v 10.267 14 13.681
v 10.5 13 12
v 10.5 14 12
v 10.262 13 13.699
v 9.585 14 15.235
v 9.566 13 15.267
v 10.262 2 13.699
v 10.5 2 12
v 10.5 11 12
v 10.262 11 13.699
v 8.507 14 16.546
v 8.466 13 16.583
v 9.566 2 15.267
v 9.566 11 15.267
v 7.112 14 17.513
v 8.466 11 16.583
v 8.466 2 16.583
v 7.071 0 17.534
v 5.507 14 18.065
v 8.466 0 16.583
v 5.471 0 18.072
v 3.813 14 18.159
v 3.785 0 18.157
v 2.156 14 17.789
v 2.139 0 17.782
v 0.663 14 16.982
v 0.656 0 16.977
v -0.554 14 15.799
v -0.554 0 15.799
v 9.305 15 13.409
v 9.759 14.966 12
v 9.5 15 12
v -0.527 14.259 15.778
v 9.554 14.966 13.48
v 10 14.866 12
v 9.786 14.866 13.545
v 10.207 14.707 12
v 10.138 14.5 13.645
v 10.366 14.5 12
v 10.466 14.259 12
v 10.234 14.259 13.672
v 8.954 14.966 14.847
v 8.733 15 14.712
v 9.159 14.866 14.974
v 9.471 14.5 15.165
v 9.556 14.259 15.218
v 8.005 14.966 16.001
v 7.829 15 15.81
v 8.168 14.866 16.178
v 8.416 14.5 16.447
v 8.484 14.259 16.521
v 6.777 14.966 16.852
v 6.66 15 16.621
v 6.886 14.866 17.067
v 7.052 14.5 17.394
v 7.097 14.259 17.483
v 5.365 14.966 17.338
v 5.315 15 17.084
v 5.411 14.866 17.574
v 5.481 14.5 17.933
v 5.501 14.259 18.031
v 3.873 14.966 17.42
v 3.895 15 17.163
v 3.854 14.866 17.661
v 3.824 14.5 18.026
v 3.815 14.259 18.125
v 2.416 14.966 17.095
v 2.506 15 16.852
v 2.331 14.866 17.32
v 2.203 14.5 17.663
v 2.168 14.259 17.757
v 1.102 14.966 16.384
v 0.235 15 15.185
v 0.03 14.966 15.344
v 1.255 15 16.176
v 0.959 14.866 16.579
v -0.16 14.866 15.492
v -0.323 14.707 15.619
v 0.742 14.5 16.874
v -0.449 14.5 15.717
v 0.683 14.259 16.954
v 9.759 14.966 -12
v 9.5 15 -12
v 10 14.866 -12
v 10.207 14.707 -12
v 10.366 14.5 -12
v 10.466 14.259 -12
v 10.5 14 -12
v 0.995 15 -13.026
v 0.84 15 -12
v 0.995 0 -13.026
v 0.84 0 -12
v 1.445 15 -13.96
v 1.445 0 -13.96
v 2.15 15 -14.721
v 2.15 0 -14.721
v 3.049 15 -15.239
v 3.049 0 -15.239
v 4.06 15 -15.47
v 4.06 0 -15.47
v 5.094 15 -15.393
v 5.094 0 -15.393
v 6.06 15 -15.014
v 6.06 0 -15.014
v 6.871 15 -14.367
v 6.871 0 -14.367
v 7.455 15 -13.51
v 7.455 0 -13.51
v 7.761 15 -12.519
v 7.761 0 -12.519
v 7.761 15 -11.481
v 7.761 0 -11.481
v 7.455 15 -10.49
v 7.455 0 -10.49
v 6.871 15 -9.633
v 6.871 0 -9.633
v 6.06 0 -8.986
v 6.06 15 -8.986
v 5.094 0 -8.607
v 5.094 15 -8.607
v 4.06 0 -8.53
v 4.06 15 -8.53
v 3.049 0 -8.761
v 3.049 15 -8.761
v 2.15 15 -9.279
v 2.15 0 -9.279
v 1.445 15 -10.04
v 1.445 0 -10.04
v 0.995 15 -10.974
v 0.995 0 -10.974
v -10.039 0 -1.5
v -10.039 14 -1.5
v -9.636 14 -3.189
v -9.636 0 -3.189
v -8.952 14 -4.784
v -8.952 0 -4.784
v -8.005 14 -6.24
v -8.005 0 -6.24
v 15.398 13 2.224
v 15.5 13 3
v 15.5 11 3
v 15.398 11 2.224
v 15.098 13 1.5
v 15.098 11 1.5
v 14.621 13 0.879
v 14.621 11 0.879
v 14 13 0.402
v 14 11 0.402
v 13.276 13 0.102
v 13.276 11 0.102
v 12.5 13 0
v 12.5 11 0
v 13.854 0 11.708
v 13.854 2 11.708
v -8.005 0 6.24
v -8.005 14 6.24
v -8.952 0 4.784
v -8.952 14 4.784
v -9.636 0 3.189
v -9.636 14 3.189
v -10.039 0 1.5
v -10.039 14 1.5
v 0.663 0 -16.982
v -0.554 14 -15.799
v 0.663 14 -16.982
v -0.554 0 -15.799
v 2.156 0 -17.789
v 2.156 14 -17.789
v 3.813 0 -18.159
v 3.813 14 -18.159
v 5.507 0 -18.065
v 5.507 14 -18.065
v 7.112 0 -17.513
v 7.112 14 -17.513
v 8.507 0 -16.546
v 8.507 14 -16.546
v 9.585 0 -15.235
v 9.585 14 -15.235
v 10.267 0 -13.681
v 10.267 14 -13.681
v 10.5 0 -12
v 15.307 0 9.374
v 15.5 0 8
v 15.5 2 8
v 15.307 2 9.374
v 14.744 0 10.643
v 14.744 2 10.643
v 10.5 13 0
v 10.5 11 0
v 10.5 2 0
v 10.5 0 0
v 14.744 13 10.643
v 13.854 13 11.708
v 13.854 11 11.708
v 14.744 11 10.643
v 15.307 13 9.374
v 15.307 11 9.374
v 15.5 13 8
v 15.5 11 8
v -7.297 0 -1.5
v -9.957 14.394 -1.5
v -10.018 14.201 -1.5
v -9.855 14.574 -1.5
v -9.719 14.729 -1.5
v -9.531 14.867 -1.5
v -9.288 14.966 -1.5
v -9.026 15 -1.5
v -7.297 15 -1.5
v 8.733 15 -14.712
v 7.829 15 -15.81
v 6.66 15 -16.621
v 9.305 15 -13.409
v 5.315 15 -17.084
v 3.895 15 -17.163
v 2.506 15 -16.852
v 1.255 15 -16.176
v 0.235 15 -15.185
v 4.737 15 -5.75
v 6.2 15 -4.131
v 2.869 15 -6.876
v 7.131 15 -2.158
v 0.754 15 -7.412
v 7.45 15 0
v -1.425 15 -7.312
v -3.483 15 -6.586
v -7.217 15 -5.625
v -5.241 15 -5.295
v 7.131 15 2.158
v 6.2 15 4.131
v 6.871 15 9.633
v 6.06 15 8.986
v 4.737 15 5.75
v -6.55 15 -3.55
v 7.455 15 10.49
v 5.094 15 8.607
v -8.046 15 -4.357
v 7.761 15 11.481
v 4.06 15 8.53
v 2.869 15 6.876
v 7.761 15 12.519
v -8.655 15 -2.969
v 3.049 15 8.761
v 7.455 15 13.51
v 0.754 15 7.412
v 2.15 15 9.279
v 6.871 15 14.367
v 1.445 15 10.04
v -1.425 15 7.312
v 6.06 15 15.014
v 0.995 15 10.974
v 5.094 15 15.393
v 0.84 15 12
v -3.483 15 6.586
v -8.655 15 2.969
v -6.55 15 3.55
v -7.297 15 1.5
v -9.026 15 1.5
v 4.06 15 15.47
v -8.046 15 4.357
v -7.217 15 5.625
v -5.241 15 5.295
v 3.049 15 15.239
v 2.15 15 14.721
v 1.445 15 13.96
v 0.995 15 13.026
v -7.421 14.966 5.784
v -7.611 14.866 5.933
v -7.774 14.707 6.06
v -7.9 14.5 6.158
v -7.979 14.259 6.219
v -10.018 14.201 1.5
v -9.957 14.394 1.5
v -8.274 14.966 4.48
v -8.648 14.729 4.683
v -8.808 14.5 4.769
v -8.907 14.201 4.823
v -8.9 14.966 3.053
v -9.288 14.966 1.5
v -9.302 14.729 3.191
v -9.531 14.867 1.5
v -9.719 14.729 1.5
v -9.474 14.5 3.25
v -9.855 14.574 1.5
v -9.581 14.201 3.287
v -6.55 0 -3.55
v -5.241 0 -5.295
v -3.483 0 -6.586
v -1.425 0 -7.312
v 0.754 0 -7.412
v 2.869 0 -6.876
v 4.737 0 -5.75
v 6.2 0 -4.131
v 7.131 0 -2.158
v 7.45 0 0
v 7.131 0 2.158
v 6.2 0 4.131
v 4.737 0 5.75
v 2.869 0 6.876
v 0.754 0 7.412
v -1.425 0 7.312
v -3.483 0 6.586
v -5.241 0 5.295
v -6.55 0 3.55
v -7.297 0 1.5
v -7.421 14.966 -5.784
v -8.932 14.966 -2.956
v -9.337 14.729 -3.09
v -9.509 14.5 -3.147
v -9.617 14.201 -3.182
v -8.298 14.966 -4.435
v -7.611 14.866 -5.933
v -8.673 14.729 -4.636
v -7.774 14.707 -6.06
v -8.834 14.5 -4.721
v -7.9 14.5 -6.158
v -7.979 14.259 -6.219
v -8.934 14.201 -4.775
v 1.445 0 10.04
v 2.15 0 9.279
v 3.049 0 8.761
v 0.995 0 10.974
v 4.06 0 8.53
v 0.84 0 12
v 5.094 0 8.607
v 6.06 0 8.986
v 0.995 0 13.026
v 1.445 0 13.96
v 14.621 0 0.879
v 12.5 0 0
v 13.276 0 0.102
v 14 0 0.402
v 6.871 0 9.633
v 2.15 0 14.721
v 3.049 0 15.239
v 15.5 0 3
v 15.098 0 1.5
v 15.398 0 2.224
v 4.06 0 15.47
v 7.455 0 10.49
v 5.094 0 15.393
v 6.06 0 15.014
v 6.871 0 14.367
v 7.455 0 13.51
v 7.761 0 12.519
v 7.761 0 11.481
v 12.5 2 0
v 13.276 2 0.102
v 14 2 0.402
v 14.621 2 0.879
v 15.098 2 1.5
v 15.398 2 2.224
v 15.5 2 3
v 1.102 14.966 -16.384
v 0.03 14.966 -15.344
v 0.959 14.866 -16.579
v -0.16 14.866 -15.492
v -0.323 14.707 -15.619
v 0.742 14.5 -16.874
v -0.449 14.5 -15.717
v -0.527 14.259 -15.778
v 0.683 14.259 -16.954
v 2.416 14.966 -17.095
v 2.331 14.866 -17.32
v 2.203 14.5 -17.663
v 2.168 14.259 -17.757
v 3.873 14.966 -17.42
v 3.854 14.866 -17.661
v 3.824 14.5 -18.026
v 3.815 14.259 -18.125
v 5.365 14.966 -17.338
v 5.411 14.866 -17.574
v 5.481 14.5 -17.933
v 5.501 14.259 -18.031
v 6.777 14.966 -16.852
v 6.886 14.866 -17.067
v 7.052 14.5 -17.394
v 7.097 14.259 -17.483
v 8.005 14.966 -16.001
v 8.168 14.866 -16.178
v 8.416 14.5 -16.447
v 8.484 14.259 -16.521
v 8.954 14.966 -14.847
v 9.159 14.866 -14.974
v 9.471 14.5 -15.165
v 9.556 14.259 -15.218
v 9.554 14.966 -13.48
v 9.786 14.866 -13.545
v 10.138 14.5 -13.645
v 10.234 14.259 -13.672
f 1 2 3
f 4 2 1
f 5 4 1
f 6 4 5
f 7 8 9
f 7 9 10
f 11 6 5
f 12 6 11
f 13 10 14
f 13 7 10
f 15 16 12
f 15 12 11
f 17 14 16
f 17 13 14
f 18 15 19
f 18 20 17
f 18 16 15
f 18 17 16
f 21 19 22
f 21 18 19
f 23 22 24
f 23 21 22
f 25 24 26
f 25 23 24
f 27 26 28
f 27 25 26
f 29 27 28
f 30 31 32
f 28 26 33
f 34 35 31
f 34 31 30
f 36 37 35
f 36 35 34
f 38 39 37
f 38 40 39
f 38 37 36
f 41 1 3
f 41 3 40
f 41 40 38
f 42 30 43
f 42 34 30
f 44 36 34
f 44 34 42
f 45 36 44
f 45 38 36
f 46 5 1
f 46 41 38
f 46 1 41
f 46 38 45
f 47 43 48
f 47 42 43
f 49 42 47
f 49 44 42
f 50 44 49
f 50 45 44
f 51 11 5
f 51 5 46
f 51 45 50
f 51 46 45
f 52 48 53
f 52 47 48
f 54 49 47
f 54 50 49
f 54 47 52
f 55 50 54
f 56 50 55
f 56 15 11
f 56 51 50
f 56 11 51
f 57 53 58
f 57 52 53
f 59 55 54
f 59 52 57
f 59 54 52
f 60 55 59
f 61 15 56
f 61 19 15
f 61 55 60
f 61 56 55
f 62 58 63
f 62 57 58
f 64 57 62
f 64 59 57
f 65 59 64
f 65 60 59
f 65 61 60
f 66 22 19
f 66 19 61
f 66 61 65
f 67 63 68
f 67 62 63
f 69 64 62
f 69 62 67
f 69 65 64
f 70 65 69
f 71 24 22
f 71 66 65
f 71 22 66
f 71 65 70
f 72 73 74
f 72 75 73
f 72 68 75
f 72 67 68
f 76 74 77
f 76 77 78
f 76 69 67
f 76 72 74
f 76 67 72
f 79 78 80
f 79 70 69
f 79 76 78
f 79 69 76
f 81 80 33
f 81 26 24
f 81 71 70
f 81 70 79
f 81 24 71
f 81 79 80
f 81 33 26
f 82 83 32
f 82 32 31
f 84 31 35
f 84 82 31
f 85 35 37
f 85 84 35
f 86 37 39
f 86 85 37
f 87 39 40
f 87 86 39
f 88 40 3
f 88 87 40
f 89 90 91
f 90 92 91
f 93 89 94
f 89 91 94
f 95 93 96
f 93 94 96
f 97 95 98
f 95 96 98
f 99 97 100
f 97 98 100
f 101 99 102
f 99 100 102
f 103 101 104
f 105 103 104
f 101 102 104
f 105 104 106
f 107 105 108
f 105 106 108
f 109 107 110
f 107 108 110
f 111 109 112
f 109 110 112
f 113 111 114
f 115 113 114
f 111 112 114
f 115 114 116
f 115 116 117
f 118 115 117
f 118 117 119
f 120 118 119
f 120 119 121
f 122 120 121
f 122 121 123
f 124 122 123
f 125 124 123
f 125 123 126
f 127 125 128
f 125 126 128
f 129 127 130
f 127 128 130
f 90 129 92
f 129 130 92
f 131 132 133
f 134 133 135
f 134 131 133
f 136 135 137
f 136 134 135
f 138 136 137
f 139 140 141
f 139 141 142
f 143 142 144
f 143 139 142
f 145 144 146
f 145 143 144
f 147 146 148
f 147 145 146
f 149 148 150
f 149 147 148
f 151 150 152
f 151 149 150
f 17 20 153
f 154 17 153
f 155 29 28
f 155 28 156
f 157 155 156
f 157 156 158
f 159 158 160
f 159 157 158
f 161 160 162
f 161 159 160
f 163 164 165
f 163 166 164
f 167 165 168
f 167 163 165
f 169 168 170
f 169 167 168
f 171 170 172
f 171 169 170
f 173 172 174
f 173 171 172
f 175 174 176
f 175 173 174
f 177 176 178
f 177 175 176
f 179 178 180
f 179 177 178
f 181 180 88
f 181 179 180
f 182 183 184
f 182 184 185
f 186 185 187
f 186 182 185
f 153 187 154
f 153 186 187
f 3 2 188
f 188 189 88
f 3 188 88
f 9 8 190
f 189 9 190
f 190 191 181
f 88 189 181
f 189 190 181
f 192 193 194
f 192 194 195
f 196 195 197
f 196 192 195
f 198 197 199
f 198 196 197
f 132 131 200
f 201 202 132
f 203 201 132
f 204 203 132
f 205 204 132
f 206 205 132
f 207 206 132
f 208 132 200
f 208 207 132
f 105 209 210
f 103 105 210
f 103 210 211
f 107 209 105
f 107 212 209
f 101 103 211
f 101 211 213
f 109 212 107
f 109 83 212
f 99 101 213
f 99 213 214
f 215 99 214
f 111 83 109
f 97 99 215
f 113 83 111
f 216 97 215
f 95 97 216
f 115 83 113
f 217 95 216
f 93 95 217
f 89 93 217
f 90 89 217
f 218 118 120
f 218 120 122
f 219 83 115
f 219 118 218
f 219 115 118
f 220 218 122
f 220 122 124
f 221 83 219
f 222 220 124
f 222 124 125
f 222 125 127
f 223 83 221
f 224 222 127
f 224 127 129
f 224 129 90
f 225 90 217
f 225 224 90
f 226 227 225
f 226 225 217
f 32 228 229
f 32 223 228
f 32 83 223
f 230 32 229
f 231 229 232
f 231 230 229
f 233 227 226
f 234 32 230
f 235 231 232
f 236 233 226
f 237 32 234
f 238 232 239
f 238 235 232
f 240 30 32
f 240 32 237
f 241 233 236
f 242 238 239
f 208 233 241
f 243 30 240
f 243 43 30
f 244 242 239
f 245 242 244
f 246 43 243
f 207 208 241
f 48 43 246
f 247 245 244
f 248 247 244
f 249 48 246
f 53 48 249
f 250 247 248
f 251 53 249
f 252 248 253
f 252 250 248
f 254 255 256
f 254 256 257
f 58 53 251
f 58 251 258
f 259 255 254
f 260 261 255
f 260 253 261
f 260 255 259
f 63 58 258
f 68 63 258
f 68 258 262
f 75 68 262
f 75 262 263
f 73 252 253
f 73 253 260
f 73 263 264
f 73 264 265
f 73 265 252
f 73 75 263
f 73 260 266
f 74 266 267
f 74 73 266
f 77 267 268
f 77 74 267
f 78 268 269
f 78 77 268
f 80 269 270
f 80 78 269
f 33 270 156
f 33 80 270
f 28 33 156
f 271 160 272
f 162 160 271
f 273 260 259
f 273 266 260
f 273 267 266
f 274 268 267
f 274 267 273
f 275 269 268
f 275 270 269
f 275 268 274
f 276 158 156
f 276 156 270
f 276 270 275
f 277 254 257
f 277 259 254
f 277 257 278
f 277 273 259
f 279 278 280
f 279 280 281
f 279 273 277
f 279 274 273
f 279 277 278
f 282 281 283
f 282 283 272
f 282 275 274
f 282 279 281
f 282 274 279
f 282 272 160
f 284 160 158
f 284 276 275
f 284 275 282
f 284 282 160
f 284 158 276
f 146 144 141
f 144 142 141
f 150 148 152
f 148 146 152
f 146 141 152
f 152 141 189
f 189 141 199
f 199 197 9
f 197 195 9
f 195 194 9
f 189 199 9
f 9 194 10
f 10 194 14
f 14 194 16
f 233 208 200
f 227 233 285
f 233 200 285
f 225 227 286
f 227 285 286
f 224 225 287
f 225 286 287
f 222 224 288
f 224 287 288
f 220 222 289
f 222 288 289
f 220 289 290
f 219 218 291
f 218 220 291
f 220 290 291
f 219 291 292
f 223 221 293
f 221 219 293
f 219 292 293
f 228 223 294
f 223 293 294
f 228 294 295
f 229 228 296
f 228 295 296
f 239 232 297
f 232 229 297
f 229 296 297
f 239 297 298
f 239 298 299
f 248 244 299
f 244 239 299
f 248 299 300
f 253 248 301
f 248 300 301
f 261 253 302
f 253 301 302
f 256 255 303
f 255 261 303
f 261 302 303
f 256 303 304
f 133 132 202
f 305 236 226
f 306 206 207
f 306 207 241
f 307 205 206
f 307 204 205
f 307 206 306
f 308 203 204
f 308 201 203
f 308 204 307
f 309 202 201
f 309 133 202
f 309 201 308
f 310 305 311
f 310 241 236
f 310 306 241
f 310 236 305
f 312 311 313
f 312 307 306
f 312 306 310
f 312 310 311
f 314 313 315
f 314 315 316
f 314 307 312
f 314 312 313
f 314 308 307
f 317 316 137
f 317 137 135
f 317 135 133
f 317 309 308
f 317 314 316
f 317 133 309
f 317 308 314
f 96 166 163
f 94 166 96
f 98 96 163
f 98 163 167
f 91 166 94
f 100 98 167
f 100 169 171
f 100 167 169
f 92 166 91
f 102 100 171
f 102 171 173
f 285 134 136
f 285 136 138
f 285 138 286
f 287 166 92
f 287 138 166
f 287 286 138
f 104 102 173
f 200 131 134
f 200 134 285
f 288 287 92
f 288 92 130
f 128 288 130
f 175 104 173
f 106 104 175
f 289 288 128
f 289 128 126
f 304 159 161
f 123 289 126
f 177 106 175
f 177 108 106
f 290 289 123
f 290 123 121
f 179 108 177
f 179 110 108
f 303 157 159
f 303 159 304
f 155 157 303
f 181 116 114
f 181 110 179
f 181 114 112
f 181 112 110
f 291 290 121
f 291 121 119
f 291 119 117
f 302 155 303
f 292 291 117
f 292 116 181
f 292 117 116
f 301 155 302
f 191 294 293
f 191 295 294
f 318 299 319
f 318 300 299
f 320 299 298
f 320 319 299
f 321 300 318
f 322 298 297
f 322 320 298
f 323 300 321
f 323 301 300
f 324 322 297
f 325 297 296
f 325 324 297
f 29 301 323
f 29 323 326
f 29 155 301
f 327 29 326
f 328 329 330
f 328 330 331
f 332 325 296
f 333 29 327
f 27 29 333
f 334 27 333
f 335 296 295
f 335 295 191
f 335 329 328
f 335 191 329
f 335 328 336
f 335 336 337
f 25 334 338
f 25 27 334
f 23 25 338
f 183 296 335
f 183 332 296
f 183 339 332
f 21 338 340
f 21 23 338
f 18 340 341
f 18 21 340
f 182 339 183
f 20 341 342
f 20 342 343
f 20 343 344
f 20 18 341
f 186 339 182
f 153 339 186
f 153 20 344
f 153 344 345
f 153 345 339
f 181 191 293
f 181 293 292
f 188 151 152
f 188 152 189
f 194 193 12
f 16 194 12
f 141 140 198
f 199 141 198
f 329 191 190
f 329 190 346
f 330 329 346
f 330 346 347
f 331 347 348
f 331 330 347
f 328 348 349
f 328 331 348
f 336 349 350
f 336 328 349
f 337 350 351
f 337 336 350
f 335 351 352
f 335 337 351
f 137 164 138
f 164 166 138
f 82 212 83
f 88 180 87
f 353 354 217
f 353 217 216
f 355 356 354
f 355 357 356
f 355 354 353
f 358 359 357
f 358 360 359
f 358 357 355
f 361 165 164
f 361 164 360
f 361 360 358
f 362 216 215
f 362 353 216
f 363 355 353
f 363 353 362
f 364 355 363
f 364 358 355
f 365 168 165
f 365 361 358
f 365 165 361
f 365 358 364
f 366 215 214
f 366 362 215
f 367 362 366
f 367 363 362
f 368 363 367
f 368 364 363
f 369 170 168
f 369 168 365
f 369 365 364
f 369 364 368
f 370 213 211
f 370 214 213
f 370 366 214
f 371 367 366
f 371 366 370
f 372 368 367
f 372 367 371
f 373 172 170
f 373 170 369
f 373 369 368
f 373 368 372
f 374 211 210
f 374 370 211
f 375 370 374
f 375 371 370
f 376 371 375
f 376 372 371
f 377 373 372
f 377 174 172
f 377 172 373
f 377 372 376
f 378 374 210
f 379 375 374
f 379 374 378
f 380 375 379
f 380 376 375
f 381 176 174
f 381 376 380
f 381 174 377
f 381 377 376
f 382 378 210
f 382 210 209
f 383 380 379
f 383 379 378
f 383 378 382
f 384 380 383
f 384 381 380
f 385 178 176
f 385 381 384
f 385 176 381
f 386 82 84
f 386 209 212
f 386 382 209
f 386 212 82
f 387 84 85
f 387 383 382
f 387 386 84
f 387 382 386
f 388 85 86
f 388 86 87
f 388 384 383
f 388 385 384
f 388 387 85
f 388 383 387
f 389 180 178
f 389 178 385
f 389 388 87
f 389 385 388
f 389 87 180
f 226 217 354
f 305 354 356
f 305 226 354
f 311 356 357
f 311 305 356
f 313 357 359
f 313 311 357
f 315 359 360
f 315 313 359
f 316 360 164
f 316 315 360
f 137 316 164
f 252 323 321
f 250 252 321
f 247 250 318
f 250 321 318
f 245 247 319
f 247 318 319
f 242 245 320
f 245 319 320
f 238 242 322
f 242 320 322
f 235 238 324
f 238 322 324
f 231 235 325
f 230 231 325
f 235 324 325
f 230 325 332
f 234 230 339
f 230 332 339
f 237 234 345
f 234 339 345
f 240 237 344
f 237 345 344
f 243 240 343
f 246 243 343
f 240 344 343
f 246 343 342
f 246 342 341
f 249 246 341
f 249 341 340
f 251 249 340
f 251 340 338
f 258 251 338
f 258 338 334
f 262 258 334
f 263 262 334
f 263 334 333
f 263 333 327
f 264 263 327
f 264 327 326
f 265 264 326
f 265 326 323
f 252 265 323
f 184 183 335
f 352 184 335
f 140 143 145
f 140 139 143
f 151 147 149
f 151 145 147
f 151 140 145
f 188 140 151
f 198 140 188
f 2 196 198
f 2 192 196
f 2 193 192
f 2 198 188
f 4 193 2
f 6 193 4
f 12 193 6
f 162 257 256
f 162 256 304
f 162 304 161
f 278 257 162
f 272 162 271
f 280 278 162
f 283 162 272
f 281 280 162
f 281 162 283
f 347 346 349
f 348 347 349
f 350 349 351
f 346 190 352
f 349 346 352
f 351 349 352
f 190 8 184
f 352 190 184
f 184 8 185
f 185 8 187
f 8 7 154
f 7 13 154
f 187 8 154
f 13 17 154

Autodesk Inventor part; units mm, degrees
ref_plane "YZ Plane" through (0, 0, 0) normal (1, 0, 0) x (0, 1, 0)
ref_plane "XZ Plane" through (0, 0, 0) normal (0, 1, 0) x (-1, 0, 0)
sketch "Sketch1" plane through (0, 0, 0) normal (0, 1, 0) x (-1, 0, 0)
  circle A0 centre (0, 0) radius 7.45
  line L0 (0, 0) -> (-4.32, 12)
  circle A1 centre (-4.32, 12) radius 3.48
  circle A2 centre (-4.32, 12) radius 6.18
  line L1 (-10.5, 28.575) -> (-10.5, -28.575)
  line L2 (7.45, 0) -> (-7.45, 0)
  circle A3 centre (0, 0) radius 10.15
  line L3 (0.5542, 15.7993) -> (8.0054, 6.2399)
  circle A4 centre (-4.32, -12) radius 3.48
  circle A5 centre (-4.32, -12) radius 6.18
  line L4 (0.5542, -15.7993) -> (8.0054, -6.2399)
  point P0 (-10.5, 0)
  point P1 (-10.5, 12)
  point P2 (-10.5, -12)
  dimension "d0" = 14.9
  dimension "d7" = 2.7
  dimension "d1" = 6.96
  dimension "d3" = 10.5
  dimension "d5" = 2.7
  dimension "d6" = 12
extrude "Extrusion1" add sketch "Sketch1" along normal blind 15 contours A0 A2 A3 A5 | A0 L0 A1 A3 A2 | A5 A3 A4 A0 | A0 A2 A3 A1 L0 | A3 A1 A2 | A2 L3 A3 | A5 A3 A2 A0 | A5 A3 A4 | A3 L4 A5 | A5 L1 A2 A3
sketch "Sketch2" plane through (0, 0, 0) normal (0, -1, 0) x (1, 0, 0)
  arc A0 (10.5, 12) -> (-0.5542, 15.7993) centre (4.32, 12) ccw projected
  line L0 (8.4662, 16.5827) -> (13.8545, 11.7077)
  line L1 (15.5, 8) -> (15.5, 3)
  line L2 (10.5, 12) -> (10.5, -12) projected
  arc A1 (15.5, 8) -> (13.8545, 11.7077) centre (10.5, 8) ccw
  line L3 (10.5, 0) -> (12.5, 0)
  arc A2 (12.5, 0) -> (15.5, 3) centre (12.5, 3) ccw
  line L4 (10.5, -12) -> (10.5, 12)
  arc A3 (10.5, 12) -> (-0.5542, 15.7993) centre (4.32, 12) ccw
  point P0 (0, 0)
  point P1 (15.5, 0)
  dimension "d10" = 5
  dimension "d11" = 5
  dimension "d12" = 8
  dimension "d13" = 3
  dimension "d14" = 0
extrude "Extrusion2" add sketch "Sketch2" against normal blind 2
ref_plane "Work Plane1" through (0, 6.5, 0) normal (0, 1, 0) x (1, 0, 0)
mirror "Mirror1" about plane through (0, 6.5, 0) normal (0, 1, 0) of "Extrusion2"
fillet "Fillet1" radius 1 6 edges at (6.3287, 15, -17.8444) (-4.2798, 15, -11.0196) (-10.15, 15, 0) (-4.2798, 15, 11.0196) (6.3287, 15, 17.8444) (10.5, 15, 0)
sketch "Sketch3" plane through (0, 15, 0) normal (0, 1, 0) x (1, 0, 0)
  line L0 (-17.025, 1.5) -> (-2.025, 1.5)
  line L1 (-2.025, 1.5) -> (-2.025, -1.5)
  line L2 (-2.025, -1.5) -> (-17.025, -1.5)
  line L3 (-17.025, -1.5) -> (-17.025, 1.5)
  line L4 (-17.025, 1.5) -> (-2.025, -1.5) construction
  line L5 (-2.025, 1.5) -> (-17.025, -1.5) construction
  point P0 (0, 0)
  point P1 (-9.525, 0)
  dimension "d19" = 3
  dimension "d20" = 1.5
  dimension "d21" = 15
extrude "Extrusion3" cut sketch "Sketch3" against normal through all
properties part number "PresaPilotInventorVersion"
